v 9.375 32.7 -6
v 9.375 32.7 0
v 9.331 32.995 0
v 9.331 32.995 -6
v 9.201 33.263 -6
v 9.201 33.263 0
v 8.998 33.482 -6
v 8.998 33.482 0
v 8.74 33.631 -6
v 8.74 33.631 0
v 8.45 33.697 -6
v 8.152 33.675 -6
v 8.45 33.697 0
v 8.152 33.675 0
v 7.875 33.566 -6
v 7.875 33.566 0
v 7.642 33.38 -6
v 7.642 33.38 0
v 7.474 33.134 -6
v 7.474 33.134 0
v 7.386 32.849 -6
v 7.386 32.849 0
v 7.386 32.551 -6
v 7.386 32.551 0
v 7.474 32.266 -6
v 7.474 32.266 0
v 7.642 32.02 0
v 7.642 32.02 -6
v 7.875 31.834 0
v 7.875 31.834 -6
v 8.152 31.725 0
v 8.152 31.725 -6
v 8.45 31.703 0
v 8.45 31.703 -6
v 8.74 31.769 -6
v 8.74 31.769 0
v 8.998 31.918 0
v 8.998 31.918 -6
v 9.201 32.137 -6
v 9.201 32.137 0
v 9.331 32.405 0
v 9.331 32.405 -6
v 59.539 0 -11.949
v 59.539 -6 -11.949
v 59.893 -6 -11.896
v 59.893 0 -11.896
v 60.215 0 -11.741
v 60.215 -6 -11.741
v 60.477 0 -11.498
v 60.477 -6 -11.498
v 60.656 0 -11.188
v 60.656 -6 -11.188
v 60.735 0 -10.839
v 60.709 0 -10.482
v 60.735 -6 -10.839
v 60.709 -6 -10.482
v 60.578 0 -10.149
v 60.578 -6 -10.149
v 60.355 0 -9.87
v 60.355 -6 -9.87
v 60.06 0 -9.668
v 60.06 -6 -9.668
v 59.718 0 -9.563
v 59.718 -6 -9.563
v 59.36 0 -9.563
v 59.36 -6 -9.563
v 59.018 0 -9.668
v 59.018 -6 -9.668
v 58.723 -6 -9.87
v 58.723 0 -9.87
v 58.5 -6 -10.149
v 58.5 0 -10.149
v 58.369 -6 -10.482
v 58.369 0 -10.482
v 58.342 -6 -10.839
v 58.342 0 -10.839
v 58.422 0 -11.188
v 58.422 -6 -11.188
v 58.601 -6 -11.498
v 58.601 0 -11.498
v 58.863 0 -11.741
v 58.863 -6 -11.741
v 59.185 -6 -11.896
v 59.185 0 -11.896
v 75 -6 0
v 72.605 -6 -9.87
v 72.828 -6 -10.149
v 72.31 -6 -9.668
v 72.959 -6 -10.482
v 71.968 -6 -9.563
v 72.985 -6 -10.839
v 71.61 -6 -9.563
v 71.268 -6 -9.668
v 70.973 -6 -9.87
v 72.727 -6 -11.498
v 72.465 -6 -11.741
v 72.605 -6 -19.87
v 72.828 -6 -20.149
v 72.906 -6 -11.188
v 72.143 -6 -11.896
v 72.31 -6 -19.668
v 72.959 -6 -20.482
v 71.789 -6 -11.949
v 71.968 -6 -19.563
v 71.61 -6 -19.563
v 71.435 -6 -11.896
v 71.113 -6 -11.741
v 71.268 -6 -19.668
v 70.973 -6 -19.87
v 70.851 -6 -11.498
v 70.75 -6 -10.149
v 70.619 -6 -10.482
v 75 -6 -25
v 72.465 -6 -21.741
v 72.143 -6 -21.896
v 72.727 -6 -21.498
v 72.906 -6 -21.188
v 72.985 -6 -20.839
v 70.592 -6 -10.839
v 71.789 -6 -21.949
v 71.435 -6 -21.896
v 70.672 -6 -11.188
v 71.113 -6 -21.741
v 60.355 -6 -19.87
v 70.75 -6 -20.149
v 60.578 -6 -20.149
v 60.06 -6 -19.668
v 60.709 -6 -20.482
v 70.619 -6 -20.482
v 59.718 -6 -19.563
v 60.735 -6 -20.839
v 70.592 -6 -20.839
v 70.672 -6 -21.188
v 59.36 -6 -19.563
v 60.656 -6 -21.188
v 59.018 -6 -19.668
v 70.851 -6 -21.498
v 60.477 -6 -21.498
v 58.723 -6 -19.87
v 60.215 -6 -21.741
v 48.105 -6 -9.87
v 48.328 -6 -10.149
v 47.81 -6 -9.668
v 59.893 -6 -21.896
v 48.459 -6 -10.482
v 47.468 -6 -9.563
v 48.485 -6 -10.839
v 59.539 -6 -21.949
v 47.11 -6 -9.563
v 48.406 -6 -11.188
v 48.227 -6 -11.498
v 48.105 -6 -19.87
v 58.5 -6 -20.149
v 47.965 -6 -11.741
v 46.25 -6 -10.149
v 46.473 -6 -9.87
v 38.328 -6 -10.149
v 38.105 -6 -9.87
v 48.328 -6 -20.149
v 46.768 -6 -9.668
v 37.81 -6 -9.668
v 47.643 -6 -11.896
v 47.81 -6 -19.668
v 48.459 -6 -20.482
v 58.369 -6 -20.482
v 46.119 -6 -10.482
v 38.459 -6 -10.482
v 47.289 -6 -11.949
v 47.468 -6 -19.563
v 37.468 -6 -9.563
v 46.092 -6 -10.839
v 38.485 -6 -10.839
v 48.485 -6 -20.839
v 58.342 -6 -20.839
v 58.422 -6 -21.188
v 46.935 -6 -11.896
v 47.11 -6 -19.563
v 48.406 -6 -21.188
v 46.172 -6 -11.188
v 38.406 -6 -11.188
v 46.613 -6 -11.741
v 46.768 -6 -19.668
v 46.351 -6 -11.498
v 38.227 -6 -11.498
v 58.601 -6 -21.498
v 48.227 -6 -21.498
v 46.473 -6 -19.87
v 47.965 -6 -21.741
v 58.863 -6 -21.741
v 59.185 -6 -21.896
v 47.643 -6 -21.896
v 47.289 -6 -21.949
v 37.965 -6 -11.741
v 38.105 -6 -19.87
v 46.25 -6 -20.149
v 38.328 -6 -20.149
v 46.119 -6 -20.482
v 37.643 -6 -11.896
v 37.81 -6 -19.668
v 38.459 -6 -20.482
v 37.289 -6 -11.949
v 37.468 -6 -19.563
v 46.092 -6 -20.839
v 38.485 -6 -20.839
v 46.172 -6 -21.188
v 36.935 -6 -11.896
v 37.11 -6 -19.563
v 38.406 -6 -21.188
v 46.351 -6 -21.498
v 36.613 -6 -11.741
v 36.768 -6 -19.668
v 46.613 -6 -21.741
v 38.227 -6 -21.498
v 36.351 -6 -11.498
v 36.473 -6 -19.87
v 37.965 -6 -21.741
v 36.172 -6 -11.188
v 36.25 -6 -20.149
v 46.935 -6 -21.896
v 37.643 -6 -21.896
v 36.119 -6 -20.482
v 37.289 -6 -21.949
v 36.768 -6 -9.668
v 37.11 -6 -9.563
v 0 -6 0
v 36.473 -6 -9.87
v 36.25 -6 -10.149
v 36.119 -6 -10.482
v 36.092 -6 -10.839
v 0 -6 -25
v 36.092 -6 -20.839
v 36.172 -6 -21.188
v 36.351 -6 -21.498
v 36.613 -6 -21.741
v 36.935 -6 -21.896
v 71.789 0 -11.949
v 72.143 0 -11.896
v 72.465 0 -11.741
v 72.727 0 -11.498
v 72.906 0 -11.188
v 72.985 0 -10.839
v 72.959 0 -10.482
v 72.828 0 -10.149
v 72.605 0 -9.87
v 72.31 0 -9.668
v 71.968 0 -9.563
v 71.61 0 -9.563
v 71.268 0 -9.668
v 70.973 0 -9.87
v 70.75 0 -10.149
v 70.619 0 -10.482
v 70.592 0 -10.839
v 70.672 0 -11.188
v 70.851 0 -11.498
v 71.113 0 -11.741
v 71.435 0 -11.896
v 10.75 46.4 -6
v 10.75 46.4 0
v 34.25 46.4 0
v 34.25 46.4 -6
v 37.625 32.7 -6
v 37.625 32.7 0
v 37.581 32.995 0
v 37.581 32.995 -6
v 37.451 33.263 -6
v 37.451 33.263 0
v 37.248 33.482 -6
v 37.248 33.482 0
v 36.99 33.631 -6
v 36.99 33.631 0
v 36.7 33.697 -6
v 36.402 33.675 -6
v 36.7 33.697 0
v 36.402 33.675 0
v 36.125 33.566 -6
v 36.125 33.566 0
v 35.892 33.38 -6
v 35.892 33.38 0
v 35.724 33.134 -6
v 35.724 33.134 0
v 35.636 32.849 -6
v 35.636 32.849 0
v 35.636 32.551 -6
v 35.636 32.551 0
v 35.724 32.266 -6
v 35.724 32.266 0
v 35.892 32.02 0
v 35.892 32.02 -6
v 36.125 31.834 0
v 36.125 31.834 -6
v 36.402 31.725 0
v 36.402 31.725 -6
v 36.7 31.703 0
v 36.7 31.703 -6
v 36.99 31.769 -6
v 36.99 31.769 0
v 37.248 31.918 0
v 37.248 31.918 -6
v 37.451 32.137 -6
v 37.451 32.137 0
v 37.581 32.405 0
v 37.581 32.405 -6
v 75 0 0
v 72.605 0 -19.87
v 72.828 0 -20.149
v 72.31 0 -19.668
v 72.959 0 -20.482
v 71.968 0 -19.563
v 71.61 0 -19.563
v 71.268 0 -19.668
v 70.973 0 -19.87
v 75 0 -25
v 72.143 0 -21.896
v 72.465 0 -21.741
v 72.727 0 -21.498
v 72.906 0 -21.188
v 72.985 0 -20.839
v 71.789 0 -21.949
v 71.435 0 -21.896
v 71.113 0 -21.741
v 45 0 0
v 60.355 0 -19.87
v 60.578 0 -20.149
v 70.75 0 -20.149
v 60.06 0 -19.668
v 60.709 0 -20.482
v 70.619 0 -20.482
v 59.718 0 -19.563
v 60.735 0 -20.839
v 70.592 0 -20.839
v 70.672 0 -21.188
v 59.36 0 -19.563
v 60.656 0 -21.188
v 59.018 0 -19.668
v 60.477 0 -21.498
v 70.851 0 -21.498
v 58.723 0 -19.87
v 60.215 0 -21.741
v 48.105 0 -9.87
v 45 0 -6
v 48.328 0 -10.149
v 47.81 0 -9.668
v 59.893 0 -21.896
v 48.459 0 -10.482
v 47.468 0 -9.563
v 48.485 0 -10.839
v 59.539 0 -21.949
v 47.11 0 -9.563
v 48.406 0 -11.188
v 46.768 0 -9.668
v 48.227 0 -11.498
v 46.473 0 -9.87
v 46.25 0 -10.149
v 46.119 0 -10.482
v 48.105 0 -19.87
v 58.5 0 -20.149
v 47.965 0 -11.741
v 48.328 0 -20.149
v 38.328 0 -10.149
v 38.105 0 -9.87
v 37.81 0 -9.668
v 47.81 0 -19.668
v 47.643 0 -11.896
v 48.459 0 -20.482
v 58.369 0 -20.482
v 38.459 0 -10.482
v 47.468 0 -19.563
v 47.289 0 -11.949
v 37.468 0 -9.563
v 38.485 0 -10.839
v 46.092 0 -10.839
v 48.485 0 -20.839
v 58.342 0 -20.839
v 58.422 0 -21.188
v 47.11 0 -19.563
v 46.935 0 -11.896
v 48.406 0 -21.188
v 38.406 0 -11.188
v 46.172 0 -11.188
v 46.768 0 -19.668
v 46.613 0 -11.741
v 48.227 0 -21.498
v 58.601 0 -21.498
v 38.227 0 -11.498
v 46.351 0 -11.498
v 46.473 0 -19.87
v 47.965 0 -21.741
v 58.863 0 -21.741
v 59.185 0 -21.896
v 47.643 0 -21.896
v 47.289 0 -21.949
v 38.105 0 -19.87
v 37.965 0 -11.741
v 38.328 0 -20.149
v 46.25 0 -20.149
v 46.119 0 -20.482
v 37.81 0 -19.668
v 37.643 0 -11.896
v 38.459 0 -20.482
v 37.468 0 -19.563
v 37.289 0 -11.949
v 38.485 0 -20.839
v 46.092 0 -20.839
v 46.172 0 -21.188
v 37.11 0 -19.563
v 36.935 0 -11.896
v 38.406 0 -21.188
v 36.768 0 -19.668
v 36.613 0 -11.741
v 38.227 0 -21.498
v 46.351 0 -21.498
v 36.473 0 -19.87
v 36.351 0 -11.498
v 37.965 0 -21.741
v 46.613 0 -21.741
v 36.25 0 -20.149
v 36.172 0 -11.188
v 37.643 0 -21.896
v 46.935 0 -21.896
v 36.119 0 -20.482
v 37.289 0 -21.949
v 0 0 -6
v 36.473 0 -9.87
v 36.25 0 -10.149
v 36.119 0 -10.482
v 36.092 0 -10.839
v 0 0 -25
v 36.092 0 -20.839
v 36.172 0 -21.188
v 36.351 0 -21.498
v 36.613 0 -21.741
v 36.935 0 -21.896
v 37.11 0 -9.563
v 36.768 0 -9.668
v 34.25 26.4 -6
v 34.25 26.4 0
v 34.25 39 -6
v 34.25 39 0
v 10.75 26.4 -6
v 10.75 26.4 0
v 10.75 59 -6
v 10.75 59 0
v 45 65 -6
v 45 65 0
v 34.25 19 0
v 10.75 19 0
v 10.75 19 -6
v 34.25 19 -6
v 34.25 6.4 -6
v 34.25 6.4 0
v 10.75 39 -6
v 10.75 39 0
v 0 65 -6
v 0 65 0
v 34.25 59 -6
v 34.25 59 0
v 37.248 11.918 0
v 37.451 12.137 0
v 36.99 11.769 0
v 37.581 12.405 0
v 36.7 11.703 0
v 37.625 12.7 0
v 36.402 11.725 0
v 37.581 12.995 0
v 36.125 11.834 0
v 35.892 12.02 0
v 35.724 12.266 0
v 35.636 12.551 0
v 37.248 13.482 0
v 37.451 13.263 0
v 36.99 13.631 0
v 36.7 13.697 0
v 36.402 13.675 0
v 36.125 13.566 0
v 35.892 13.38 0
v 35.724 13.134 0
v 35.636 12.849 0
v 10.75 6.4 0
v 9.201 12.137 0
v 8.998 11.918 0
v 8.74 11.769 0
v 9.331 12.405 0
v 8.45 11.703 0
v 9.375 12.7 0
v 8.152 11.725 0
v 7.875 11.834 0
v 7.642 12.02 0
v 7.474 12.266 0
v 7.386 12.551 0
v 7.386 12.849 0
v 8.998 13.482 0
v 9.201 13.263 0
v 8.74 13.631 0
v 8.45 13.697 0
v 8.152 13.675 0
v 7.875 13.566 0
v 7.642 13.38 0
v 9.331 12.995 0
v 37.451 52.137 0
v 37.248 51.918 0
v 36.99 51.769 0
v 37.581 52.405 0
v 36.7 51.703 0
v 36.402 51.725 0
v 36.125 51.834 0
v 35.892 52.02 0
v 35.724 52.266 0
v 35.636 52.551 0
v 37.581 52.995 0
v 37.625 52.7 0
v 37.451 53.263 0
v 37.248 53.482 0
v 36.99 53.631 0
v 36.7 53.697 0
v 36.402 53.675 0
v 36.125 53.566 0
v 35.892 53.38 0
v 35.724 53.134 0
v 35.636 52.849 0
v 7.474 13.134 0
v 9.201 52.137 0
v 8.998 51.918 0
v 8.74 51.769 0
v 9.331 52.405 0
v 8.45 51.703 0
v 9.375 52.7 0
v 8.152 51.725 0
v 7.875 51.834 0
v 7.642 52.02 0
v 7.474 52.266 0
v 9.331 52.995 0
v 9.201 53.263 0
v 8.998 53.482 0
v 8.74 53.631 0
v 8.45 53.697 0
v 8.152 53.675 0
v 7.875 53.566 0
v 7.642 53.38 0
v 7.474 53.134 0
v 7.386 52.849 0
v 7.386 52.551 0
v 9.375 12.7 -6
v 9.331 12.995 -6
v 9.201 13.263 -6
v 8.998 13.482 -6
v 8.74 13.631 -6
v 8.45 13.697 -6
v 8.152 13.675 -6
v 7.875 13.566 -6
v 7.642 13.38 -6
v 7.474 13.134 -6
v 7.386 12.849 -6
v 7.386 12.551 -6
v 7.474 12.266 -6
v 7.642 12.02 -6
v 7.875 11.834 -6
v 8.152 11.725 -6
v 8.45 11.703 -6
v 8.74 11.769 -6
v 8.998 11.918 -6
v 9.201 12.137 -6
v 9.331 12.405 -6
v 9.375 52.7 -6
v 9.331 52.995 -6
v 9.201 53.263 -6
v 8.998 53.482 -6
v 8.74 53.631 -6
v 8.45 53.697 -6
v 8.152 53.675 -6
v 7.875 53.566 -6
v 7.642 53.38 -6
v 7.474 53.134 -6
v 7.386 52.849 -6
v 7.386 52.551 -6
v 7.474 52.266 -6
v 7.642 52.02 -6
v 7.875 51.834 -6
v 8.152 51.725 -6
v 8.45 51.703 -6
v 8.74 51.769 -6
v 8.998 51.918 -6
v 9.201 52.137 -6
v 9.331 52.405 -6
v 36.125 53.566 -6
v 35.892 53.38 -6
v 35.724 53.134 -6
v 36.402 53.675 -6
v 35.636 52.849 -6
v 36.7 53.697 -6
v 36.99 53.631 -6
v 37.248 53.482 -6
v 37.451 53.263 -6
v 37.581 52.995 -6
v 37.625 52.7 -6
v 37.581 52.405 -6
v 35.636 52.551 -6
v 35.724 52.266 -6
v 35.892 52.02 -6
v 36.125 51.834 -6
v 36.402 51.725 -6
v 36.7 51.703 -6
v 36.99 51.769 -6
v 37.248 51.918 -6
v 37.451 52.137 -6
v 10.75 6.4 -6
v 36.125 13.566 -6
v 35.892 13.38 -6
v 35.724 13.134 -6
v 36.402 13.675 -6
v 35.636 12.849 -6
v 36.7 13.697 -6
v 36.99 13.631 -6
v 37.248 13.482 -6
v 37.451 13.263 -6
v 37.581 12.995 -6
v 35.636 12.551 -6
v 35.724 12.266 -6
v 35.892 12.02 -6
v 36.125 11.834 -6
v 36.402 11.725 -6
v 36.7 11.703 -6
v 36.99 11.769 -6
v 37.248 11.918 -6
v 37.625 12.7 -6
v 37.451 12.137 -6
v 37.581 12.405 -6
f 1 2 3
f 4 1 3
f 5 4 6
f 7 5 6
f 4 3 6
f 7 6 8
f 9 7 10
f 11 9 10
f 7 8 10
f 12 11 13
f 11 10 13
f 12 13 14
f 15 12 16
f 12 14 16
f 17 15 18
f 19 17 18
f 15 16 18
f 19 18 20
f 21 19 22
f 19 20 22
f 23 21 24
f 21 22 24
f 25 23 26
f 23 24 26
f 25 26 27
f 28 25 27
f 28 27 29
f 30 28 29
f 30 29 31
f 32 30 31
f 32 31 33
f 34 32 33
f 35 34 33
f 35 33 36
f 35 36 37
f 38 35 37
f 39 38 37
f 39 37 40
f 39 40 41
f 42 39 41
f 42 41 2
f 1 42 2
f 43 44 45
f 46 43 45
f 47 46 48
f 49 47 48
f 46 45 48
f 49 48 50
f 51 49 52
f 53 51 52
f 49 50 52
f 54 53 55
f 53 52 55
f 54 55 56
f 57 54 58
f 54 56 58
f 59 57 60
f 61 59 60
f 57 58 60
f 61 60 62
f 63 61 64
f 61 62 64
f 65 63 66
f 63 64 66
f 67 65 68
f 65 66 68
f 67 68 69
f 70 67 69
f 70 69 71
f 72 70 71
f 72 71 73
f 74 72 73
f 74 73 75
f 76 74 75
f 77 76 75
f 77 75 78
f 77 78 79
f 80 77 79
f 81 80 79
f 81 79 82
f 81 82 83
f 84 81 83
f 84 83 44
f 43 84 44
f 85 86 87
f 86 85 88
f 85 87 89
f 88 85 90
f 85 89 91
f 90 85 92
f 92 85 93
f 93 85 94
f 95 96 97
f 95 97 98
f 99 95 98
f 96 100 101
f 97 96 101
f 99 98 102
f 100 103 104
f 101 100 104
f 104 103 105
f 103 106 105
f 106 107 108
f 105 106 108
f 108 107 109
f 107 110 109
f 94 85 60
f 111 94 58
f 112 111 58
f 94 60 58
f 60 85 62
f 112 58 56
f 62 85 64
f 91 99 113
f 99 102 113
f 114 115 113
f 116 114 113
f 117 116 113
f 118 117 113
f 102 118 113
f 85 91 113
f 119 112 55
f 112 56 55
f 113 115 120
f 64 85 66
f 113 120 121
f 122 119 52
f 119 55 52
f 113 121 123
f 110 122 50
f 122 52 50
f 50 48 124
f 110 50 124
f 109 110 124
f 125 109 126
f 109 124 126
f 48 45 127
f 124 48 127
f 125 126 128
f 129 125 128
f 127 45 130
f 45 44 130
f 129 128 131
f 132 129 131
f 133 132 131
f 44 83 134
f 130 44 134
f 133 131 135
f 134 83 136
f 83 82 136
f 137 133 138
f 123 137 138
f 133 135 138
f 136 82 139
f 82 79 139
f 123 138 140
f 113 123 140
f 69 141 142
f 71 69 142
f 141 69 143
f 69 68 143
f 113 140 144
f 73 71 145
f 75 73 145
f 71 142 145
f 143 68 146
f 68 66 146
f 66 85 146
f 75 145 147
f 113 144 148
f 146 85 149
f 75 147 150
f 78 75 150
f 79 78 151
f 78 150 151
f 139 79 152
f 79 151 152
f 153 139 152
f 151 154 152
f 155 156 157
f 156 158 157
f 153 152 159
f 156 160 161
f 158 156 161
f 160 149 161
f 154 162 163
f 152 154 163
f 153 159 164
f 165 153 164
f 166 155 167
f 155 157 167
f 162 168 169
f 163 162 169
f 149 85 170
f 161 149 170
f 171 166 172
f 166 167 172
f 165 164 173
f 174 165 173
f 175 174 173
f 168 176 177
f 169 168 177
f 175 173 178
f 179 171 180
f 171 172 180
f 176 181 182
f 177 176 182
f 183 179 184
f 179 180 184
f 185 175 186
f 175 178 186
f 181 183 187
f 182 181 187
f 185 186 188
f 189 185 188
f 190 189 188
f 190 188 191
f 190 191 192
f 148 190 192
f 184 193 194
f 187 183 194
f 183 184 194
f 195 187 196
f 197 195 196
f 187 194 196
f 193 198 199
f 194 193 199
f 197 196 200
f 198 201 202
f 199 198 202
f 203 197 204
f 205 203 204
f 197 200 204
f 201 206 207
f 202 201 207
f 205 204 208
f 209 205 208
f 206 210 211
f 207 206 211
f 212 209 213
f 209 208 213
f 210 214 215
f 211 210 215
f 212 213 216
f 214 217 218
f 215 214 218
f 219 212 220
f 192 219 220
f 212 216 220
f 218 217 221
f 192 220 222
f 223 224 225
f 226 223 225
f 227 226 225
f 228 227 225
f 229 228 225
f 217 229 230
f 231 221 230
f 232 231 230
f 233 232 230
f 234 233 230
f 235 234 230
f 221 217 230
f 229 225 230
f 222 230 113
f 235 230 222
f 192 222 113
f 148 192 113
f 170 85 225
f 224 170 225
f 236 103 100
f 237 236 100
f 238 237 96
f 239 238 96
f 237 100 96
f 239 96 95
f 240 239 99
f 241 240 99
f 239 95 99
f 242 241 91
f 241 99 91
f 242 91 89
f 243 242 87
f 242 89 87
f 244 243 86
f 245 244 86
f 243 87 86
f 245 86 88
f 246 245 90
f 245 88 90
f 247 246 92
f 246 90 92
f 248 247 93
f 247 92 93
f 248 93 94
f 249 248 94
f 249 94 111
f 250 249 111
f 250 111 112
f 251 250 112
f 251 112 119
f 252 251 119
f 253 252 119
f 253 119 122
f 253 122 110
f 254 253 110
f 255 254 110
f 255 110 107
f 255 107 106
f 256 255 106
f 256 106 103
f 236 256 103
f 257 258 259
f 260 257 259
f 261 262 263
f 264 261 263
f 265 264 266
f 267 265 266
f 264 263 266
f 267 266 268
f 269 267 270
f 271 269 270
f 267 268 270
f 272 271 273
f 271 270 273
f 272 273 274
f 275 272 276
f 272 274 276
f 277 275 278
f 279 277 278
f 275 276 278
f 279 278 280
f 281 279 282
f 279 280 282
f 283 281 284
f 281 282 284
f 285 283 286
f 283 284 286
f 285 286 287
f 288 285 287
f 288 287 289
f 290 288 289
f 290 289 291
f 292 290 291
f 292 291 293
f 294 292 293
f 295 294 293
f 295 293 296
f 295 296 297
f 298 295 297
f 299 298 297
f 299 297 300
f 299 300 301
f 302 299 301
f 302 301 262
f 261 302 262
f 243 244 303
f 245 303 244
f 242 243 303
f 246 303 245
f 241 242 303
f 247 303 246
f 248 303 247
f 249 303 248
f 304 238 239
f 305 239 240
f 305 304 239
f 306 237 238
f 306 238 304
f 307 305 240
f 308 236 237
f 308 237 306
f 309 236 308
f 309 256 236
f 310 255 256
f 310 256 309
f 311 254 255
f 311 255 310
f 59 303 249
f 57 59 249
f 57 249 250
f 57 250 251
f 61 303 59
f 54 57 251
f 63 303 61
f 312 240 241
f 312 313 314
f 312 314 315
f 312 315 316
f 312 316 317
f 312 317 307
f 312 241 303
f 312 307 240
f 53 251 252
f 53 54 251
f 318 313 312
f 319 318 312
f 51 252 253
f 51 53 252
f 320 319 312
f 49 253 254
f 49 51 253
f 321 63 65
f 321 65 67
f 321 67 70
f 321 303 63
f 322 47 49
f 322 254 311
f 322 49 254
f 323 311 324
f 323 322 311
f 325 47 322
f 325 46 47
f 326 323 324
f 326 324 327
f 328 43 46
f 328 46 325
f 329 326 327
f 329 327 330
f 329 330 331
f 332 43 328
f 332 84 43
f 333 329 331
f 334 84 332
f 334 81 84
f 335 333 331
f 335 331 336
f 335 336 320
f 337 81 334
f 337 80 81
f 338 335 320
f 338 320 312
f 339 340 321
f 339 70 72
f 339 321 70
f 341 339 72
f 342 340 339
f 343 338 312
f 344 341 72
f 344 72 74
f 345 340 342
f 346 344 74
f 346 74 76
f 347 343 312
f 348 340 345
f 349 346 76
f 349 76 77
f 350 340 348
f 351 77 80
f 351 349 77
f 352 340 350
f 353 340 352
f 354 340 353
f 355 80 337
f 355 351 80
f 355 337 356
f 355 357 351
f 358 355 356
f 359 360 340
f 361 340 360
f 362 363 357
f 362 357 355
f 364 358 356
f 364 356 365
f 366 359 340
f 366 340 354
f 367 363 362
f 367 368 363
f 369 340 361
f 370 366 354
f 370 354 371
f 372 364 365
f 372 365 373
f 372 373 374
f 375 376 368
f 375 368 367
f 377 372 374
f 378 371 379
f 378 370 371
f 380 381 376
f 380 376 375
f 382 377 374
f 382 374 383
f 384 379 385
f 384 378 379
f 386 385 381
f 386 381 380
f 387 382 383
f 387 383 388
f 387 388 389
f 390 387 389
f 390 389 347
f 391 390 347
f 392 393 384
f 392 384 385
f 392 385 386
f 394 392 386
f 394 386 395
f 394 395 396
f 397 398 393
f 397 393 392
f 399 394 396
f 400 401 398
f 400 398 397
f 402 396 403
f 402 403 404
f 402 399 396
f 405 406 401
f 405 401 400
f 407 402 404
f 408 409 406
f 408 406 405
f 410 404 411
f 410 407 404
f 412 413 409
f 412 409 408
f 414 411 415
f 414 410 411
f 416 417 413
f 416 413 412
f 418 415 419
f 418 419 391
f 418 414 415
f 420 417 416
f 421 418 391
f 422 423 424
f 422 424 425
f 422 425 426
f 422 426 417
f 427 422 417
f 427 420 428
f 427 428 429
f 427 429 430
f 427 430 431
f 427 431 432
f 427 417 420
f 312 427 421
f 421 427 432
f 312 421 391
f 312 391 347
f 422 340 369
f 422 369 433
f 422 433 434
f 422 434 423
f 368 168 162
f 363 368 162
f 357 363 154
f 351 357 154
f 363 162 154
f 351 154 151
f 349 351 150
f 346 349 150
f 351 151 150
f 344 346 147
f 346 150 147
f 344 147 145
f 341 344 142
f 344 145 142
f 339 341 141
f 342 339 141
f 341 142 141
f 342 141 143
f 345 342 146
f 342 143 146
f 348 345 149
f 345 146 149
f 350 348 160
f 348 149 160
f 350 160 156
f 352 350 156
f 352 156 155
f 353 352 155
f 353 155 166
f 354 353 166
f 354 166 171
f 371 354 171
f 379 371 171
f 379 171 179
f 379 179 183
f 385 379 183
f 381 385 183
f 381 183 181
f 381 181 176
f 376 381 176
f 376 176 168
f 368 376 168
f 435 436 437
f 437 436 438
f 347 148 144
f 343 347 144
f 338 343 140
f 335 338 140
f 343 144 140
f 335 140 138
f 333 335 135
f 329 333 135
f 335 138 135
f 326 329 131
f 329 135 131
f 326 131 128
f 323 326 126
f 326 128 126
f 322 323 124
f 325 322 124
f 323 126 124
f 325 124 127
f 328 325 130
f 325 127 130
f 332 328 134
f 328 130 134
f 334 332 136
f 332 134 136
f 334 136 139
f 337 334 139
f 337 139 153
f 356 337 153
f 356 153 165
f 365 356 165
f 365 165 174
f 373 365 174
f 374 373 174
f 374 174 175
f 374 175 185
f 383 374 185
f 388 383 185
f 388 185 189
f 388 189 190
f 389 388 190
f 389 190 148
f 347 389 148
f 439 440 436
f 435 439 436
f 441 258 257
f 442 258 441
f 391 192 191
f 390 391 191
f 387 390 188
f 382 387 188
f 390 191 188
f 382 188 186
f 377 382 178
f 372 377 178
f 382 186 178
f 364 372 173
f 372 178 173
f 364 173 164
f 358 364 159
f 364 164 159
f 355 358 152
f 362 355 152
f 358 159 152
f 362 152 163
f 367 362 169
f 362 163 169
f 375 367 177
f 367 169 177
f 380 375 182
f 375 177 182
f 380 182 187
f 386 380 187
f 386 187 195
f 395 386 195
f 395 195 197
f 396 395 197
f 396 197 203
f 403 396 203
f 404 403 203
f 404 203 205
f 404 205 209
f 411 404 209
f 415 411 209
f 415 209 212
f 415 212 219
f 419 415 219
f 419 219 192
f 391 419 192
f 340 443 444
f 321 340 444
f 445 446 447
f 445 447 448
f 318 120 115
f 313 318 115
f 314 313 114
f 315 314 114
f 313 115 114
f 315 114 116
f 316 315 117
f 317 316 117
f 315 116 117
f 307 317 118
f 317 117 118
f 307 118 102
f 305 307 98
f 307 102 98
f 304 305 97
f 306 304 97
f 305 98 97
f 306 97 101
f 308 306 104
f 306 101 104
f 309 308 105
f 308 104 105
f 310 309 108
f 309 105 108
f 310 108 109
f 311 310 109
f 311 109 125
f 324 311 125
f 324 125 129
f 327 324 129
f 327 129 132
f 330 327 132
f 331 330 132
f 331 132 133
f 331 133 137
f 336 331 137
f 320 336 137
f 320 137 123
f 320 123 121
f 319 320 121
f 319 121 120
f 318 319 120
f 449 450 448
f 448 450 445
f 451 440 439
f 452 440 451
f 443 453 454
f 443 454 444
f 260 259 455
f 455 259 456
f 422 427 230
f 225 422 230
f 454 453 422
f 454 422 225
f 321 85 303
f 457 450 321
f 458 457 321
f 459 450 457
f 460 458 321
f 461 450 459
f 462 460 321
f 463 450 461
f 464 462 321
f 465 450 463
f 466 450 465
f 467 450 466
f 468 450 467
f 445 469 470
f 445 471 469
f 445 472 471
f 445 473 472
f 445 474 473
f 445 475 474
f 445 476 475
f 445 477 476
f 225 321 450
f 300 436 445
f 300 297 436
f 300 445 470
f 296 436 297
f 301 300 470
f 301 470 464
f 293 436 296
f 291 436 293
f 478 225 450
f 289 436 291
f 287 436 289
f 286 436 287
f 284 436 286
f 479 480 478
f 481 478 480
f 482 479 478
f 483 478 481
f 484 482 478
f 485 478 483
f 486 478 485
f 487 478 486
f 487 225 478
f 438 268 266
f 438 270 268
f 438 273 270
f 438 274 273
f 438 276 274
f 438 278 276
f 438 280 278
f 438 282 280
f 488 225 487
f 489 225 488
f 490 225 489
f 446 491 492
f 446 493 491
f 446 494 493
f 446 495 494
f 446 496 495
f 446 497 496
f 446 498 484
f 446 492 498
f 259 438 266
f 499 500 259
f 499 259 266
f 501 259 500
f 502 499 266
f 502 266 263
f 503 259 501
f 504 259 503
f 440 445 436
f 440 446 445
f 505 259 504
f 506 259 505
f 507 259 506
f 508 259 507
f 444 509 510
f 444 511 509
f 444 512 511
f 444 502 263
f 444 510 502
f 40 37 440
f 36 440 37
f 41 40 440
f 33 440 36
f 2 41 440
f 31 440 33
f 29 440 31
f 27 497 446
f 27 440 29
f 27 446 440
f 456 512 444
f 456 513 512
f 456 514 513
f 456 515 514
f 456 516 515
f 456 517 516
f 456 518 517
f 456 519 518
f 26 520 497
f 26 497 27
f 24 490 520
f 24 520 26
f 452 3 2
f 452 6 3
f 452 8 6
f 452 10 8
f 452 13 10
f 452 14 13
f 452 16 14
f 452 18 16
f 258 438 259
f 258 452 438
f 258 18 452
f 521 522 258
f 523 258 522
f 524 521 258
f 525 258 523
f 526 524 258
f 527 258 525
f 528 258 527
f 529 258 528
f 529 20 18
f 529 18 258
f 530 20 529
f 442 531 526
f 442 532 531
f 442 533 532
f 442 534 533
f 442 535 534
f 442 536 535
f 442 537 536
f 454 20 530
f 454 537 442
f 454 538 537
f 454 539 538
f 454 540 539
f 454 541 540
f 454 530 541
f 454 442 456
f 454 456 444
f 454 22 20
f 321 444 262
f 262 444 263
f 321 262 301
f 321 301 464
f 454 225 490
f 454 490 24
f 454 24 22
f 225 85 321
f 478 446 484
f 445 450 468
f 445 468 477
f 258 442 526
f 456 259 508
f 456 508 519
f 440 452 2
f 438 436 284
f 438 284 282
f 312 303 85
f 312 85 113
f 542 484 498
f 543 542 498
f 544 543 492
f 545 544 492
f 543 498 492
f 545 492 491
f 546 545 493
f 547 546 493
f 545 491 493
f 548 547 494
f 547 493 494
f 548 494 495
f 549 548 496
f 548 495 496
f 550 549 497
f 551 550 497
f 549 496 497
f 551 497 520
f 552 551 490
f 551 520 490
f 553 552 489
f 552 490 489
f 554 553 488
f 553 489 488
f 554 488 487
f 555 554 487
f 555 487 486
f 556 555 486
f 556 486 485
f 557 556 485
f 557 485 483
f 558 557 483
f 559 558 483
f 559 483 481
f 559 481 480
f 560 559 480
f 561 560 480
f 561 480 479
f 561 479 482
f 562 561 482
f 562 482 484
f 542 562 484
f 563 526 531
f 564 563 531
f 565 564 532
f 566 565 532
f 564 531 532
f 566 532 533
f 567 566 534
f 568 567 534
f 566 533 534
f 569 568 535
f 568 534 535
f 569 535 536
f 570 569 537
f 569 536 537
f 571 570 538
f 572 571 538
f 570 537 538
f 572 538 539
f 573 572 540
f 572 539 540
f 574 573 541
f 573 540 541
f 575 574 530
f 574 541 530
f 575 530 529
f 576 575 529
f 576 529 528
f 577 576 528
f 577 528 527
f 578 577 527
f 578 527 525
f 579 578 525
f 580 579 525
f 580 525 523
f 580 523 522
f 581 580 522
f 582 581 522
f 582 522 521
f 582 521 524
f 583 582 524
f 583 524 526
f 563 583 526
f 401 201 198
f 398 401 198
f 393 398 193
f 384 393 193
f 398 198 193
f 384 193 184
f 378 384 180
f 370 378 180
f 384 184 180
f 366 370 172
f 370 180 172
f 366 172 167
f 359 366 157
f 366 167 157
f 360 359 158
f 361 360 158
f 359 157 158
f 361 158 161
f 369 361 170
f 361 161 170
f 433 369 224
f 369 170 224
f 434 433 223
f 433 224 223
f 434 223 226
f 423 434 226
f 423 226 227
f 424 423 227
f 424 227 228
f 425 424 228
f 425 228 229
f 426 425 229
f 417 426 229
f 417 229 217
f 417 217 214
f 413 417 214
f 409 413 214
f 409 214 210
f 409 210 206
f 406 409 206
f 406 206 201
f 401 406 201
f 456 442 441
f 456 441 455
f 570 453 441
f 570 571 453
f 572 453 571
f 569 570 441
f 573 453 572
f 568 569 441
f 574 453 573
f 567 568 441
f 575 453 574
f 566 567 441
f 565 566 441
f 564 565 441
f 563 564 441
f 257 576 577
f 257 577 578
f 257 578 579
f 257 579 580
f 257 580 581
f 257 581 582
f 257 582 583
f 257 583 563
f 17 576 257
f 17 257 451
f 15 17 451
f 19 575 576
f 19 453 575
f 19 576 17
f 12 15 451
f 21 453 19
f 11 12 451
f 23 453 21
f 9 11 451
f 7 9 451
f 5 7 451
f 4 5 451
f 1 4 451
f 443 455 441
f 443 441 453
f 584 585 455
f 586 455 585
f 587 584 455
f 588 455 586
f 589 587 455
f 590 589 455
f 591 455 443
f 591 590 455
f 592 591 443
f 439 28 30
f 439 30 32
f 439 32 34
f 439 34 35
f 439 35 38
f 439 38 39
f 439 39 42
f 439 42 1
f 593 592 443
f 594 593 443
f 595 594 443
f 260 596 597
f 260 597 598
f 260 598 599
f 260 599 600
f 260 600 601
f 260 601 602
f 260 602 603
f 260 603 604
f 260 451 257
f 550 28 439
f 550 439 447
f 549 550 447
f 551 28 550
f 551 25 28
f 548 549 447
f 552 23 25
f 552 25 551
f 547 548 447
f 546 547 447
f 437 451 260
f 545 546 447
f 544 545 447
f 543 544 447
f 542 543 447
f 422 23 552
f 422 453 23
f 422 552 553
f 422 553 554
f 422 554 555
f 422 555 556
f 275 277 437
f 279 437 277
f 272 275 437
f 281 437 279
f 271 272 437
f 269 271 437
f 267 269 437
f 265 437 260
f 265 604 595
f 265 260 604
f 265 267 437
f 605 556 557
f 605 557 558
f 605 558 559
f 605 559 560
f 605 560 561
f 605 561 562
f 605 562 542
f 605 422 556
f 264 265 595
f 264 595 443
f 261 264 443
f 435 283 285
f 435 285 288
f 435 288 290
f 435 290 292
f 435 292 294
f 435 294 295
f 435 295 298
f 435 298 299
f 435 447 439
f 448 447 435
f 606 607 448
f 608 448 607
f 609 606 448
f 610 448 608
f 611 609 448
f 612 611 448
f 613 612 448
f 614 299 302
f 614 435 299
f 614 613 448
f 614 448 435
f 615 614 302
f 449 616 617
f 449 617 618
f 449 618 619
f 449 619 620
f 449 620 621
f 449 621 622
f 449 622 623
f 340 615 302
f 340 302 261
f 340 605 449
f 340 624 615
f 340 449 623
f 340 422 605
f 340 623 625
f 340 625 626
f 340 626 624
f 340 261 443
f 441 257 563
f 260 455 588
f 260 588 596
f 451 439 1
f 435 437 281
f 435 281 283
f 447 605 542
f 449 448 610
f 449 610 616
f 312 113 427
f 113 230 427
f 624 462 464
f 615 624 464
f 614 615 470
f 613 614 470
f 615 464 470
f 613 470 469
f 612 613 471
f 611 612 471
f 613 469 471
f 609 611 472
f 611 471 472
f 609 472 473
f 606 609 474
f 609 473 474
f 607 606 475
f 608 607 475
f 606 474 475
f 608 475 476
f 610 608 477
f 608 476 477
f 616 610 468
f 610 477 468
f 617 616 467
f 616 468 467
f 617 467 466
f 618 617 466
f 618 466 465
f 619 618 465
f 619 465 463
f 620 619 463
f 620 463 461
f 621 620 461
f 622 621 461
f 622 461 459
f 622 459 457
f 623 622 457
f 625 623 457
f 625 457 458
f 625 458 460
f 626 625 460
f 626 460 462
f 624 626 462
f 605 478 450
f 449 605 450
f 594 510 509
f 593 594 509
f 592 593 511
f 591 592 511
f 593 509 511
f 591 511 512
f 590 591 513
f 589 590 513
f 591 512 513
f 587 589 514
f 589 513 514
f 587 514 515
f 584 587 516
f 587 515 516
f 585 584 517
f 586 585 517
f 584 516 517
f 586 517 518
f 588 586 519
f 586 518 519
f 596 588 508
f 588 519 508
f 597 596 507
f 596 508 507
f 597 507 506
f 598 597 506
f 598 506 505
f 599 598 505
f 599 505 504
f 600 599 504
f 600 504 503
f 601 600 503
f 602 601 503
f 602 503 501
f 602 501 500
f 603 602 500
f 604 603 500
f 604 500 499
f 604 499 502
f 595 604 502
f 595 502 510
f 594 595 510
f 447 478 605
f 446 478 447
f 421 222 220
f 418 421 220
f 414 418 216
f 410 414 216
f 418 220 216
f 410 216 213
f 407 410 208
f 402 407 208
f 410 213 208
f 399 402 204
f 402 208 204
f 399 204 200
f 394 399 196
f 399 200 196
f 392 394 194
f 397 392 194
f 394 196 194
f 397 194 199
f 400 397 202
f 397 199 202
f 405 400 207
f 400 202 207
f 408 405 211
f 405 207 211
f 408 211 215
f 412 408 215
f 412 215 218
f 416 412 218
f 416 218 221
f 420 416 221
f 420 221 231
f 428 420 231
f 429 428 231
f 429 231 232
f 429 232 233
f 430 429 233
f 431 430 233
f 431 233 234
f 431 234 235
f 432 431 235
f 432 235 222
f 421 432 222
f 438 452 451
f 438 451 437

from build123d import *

# Parameters (mm, degrees)
SKETCH1_W           = 45
SKETCH1_H           = 6
BOSS_EXTRUDE1_DEPTH = 65
SKETCH2_R           = 1
SKETCH2_W           = 23.5
SKETCH2_H           = 12.6
CUT_EXTRUDE1_DEPTH  = 80.284298572
LPATTERN1_COUNT     = 3
LPATTERN1_PITCH     = 20
SKETCH3_W           = 45
SKETCH3_H           = 25
BOSS_EXTRUDE2_DEPTH = 6
SKETCH4_W           = 25
SKETCH4_H           = 6
BOSS_EXTRUDE3_DEPTH = 30
SKETCH5_R           = 1.2
CUT_EXTRUDE2_DEPTH  = 107.259117256


with BuildPart() as part:
    # Sketch1 → Boss-Extrude1 (new body)
    with BuildSketch(Plane(origin=(0, 0, 0), x_dir=(1, 0, 0), z_dir=(0, 1, 0))):
        with Locations((22.5, 3)):
            Rectangle(SKETCH1_W, SKETCH1_H)
    extrude(amount=BOSS_EXTRUDE1_DEPTH)

    # Sketch2 → Cut-Extrude1 (cut, through all)
    with BuildSketch(Plane.XY):
        with Locations((8.375, 52.7)):
            Circle(SKETCH2_R)
        with Locations((36.625, 52.7)):
            Circle(SKETCH2_R)
        with Locations((22.5, 52.7)):
            Rectangle(SKETCH2_W, SKETCH2_H)
    cut_extrude1 = extrude(amount=-CUT_EXTRUDE1_DEPTH, mode=Mode.SUBTRACT)

    # LPattern1: Cut-Extrude1 ×3
    with Locations(*[(0, -i * LPATTERN1_PITCH, 0) for i in range(1, LPATTERN1_COUNT)]):
        add(cut_extrude1, mode=Mode.SUBTRACT)

    # Sketch3 → Boss-Extrude2 (add)
    with BuildSketch(Plane.XZ):
        with Locations((22.5, -12.5)):
            Rectangle(SKETCH3_W, SKETCH3_H)
    extrude(amount=BOSS_EXTRUDE2_DEPTH)

    # Sketch4 → Boss-Extrude3 (add)
    with BuildSketch(Plane(origin=(45, 0, 0), x_dir=(0, 0, -1), z_dir=(1, 0, 0))):
        with Locations((12.5, -3)):
            Rectangle(SKETCH4_W, SKETCH4_H)
    extrude(amount=BOSS_EXTRUDE3_DEPTH)

    # Sketch5 → Cut-Extrude2 (cut, through all)
    with BuildSketch(Plane.XZ.offset(6)):
        with Locations(Location((37.288839919, -20.74934001, 0), (0, 0, 270))):
            Circle(SKETCH5_R)
        with Locations(Location((37.288839919, -10.74934001, 0), (0, 0, 270))):
            Circle(SKETCH5_R)
        with Locations(Location((47.288839919, -20.74934001, 0), (0, 0, 270))):
            Circle(SKETCH5_R)
        with Locations(Location((47.288839919, -10.74934001, 0), (0, 0, 270))):
            Circle(SKETCH5_R)
        with Locations(Location((59.538839919, -20.74934001, 0), (0, 0, 270))):
            Circle(SKETCH5_R)
        with Locations(Location((71.788839919, -20.74934001, 0), (0, 0, 270))):
            Circle(SKETCH5_R)
        with Locations(Location((71.788839919, -10.74934001, 0), (0, 0, 270))):
            Circle(SKETCH5_R)
        with Locations(Location((59.538839919, -10.74934001, 0), (0, 0, 270))):
            Circle(SKETCH5_R)
    extrude(amount=-CUT_EXTRUDE2_DEPTH, mode=Mode.SUBTRACT)


solid = part.part
